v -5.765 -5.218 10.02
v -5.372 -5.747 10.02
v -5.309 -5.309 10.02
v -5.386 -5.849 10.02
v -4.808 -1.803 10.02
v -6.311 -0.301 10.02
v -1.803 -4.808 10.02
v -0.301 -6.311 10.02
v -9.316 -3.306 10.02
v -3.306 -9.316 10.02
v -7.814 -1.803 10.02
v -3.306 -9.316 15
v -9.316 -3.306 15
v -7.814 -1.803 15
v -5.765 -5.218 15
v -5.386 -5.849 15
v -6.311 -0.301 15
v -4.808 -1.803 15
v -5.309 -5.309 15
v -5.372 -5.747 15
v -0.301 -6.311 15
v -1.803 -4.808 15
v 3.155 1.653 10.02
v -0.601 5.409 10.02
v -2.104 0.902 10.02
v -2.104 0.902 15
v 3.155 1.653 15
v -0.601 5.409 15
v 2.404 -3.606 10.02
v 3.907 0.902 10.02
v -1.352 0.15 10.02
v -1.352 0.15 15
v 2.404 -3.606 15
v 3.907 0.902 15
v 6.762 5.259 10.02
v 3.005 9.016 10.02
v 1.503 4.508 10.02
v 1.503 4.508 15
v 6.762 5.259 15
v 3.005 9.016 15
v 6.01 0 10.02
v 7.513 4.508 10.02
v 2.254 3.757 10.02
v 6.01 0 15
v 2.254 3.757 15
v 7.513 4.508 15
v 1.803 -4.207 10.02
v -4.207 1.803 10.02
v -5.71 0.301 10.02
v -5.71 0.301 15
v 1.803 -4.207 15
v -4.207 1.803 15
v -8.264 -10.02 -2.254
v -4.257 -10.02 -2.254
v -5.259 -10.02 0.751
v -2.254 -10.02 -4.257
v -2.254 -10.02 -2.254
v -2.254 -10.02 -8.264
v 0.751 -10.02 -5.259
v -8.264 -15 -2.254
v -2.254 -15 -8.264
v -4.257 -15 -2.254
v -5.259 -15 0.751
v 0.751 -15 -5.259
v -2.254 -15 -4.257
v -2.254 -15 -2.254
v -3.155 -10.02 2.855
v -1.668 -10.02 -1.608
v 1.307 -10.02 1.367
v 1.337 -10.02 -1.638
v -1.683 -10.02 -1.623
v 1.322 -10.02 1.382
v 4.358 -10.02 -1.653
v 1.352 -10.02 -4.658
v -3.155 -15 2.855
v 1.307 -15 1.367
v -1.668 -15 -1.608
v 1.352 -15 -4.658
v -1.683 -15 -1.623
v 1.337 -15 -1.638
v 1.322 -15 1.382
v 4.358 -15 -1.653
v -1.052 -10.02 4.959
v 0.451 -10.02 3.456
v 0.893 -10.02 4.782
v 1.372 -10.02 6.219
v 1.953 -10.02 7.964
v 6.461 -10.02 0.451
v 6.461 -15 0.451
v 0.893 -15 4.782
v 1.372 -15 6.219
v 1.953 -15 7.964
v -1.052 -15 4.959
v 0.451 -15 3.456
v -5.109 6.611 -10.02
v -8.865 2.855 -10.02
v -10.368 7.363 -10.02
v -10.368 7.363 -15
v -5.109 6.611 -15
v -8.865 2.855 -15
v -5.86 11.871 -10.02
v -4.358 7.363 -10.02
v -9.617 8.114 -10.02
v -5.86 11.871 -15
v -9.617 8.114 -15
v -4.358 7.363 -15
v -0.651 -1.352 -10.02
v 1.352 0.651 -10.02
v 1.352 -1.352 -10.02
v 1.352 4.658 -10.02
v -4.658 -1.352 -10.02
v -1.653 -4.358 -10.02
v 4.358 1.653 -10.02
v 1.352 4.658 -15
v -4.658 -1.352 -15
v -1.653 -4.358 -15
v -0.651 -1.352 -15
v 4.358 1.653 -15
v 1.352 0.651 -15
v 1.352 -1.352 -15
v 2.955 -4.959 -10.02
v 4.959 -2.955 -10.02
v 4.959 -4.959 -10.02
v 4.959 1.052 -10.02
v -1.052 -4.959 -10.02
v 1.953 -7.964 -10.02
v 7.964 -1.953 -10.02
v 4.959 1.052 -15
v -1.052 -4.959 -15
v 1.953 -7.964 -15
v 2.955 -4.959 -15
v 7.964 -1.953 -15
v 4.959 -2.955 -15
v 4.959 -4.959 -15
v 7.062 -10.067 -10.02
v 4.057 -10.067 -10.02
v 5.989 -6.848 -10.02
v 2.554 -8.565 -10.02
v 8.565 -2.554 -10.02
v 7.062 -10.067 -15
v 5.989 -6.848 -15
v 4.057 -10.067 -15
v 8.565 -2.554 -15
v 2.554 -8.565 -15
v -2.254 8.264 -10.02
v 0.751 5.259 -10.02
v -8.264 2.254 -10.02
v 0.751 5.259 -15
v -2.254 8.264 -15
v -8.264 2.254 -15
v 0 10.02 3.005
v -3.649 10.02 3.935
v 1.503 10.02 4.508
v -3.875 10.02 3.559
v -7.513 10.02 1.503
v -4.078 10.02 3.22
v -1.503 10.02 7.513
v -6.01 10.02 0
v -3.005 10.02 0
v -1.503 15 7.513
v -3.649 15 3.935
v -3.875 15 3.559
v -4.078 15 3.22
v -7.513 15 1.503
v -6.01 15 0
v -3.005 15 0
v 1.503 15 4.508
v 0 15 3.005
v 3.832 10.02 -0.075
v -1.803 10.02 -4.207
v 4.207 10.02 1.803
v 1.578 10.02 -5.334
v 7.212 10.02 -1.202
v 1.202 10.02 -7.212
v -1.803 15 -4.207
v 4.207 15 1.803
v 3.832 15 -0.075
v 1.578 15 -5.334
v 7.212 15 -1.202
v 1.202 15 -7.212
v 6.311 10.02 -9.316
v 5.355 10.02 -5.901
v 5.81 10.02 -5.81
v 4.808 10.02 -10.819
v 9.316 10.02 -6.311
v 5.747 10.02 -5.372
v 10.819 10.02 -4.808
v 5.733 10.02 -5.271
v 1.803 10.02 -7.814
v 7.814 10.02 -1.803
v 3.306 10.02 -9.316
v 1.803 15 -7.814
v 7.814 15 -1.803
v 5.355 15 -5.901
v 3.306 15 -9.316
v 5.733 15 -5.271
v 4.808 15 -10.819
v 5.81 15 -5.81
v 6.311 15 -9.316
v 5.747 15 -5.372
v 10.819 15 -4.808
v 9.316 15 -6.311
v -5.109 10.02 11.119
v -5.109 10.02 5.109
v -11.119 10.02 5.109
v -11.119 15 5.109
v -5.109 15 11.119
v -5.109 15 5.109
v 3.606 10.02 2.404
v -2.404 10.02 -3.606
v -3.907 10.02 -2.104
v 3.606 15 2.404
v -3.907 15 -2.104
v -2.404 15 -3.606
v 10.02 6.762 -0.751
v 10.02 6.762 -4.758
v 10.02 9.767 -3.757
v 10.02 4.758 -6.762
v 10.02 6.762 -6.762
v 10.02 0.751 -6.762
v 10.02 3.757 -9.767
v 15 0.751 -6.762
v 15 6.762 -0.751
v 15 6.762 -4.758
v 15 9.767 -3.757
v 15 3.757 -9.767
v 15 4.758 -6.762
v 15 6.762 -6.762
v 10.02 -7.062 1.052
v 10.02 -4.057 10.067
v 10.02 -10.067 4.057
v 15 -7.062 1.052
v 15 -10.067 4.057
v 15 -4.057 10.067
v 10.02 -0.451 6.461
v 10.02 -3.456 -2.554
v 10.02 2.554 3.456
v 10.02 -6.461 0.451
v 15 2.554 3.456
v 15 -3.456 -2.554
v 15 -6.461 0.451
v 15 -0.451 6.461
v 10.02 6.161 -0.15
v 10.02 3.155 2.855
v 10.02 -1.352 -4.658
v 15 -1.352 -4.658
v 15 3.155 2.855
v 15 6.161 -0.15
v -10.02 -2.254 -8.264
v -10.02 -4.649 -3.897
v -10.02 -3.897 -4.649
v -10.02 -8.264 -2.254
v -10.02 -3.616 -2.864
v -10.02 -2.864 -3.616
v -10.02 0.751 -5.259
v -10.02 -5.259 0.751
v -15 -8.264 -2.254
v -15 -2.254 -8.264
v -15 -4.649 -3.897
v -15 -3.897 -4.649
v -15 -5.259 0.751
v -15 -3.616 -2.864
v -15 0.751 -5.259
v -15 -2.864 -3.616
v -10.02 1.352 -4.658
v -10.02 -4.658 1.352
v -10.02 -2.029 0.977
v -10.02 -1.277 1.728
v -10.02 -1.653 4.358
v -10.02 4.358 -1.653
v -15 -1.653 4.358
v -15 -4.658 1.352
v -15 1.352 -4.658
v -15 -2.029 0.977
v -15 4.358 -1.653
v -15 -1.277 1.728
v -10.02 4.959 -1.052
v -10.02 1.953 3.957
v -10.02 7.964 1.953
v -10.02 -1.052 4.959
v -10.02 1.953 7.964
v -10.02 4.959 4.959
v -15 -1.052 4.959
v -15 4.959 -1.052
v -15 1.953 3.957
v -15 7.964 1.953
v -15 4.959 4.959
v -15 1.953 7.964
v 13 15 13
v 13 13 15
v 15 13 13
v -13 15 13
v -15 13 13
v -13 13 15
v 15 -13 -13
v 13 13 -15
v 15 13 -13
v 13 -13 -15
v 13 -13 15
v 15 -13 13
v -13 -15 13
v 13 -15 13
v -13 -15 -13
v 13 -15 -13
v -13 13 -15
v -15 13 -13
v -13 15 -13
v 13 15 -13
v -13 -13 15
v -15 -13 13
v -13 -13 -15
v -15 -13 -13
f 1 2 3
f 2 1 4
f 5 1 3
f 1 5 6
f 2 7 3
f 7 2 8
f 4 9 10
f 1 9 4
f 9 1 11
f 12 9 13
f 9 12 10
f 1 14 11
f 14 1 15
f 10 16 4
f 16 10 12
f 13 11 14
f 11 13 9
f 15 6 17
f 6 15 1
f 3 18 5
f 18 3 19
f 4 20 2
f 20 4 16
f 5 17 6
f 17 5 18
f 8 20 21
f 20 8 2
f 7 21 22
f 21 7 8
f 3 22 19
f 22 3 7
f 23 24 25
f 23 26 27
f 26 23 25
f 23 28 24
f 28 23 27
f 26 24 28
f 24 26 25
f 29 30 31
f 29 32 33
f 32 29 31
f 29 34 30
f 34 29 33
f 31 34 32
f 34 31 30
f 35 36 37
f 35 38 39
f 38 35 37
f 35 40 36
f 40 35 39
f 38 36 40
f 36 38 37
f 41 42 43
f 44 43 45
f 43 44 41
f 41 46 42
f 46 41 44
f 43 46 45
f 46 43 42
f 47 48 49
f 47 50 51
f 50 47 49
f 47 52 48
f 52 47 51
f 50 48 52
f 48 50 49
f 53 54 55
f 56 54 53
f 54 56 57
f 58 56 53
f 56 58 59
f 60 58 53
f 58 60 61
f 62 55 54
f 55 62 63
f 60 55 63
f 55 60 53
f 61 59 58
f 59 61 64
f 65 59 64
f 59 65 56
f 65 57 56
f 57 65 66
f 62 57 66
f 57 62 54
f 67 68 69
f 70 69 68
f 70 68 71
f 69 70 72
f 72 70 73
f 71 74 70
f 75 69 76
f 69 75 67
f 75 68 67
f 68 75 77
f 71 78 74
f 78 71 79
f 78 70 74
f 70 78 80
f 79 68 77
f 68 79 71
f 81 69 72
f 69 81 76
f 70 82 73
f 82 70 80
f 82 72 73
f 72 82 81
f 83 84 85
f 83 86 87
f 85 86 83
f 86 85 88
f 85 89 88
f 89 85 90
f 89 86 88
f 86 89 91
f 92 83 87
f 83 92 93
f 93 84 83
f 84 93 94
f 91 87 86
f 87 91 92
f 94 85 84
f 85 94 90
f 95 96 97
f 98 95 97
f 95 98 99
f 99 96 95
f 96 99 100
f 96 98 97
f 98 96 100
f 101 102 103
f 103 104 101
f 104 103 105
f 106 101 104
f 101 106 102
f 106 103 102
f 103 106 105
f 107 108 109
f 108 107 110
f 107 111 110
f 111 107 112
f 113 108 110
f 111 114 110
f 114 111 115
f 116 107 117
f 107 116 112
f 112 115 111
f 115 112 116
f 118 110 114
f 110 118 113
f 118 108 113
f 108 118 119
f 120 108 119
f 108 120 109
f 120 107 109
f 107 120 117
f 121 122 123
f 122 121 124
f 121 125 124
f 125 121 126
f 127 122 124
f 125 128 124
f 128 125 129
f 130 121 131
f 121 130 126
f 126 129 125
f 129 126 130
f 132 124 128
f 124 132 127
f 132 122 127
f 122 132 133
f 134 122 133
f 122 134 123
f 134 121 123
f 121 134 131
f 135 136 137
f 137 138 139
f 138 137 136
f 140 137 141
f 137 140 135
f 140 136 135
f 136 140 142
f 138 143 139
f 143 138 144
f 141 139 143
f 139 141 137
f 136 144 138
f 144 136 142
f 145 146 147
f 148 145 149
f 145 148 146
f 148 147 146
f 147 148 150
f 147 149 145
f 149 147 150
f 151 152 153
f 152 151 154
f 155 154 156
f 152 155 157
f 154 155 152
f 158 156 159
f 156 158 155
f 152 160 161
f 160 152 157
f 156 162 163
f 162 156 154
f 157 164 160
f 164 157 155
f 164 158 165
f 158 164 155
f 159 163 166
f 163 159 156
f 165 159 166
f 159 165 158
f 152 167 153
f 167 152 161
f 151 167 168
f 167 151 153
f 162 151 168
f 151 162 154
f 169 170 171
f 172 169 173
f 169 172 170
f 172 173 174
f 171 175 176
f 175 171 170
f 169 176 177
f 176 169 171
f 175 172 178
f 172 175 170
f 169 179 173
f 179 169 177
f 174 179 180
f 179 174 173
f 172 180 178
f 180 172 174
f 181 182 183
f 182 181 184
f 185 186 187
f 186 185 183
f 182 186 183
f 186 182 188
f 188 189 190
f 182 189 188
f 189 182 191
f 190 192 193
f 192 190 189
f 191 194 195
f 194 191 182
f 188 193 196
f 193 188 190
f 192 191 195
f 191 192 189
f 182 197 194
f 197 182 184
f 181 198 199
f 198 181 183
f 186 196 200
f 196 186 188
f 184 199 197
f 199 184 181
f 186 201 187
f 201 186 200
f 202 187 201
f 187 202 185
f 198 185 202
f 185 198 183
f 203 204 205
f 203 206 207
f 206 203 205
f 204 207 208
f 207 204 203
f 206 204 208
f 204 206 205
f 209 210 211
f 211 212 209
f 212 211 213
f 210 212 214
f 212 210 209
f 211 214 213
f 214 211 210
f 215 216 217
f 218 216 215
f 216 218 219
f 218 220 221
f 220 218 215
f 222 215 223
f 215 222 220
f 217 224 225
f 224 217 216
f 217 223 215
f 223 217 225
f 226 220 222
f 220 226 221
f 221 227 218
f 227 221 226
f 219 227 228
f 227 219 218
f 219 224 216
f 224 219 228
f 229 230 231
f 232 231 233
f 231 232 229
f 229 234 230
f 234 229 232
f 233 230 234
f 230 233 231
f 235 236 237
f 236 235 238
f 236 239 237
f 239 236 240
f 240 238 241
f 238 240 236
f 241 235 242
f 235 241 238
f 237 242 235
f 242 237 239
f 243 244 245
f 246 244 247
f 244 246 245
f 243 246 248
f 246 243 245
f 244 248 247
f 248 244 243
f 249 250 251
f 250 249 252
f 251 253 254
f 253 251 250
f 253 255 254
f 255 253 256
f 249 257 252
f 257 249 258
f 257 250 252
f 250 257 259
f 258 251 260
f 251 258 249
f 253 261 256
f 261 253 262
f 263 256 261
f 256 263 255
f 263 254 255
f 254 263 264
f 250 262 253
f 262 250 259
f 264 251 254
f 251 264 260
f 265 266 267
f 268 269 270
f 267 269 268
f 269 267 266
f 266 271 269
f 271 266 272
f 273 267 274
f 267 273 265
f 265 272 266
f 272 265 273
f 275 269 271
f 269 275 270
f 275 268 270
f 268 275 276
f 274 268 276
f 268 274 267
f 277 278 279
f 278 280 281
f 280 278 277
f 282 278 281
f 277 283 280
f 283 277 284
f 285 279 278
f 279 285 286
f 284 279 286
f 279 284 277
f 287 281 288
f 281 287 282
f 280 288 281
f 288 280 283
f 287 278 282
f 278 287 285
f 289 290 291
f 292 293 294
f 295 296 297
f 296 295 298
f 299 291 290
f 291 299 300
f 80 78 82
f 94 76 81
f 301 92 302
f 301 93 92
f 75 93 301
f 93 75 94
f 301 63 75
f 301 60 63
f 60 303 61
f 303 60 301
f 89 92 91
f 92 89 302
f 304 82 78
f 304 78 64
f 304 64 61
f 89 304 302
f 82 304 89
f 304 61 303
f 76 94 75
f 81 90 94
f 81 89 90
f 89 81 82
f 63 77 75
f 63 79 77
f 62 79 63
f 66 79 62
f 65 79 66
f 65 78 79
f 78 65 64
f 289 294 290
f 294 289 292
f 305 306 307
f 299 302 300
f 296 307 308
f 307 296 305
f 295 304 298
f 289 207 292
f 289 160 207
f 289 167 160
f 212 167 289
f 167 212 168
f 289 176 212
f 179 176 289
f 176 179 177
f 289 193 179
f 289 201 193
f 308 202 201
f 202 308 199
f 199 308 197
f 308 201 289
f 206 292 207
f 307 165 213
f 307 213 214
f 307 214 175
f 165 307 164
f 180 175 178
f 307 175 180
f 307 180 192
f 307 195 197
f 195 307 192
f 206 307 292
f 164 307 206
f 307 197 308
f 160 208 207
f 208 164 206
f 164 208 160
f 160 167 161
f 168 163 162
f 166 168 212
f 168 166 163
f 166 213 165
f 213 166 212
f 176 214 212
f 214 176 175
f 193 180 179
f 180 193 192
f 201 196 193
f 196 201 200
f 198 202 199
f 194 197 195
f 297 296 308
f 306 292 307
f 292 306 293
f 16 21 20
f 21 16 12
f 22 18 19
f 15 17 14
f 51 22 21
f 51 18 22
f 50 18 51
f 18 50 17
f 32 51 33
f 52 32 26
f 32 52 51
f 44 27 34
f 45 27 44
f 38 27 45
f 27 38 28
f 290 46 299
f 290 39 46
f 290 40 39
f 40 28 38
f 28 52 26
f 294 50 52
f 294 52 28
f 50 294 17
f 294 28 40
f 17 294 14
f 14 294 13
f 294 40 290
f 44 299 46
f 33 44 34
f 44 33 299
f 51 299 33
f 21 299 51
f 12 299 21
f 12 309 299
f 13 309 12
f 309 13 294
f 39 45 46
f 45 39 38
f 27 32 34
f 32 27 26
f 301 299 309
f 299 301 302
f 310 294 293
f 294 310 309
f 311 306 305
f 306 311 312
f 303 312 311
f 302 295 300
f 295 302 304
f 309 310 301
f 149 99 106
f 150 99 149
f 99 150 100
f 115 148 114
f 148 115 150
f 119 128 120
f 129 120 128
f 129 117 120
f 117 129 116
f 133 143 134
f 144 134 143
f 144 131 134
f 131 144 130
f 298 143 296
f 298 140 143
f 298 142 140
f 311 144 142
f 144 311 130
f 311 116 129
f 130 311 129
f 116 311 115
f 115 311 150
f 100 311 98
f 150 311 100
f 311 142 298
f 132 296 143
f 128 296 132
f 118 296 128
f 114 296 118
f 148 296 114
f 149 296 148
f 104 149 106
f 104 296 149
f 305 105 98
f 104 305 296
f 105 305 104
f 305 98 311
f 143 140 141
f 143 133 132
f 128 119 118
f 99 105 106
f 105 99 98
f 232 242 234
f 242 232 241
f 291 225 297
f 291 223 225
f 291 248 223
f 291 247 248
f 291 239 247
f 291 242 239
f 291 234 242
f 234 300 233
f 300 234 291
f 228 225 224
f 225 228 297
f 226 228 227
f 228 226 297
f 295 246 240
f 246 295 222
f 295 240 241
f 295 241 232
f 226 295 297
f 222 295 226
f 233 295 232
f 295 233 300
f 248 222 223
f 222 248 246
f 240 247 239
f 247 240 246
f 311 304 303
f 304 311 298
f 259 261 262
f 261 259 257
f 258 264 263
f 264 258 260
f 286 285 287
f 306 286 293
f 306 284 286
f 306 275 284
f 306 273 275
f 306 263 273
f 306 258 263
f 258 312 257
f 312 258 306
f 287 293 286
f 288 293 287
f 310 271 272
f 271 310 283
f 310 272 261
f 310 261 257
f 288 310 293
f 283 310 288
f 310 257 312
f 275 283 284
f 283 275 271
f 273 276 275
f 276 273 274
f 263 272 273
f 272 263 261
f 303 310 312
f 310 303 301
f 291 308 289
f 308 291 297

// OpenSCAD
// fcubewithtextv1_0
// GPLv2
// (c) 2013 TakeItAndRun
//
// v0_1:
// 
// 
//

// INCLUDE

//use <lowpolyfont v1_0.scad>;
//file pasted at end of file

//*******************************************************
//
//
//
//*******************************************************

/* [text] */

ttext1="KISS";
ttext2="EAT";
ttext3="SLEEP";
ttext4="DRINK";
ttext5="LOVE";
ttext6="HUG";

/* type */

//depth of text
dt=5;//[1:10]

//scale for all text
s0=8.5;//[1:25]
//individual text scale
s1=1.0;
s2=1.0;
s3=1.0;
s4=1.0;
s5=1.0;
s6=1.0;

/* [dice] */

//size of dice
dd=30;//[5:100]

//width of edge
de=2;//[1:10]


/* HIDDEN */

ttext=[ttext1,ttext2,ttext3,ttext4,ttext5,ttext6];
s=s0*[s1,s2,s3,s4,s5,s6];

//*******************************************************
//
// basic definitions
//
//*******************************************************


// circle have $fn facets
$fn=32;

// small displacement to avoid parallel faces with zero volume
e=0.02;

// unit vectors
xaxis=[1,0,0];
yaxis=[0,1,0];
zaxis=[0,0,1];

// golden ratio
phi=(1+sqrt(5))/2;

//*******************************************************
//
// dimensions
//
//*******************************************************

dxprint=3;

col1="red";
col2="lime";


//*******************************************************
//
// routines
//
//*******************************************************

module fcube(v=[dd,dd,dd],f=de,center=false){
	translate(center?0:f*[1,1,1])
	minkowski(){
		cube(v-2*f*[1,1,1],center);
		scale(f)polyhedron(
			[[1,0,0],[0,1,0],[-1,0,0],[0,-1,0],[0,0,1],[0,0,-1]],
			[[0,1,4],[1,2,4],[2,3,4],[3,0,4],[1,0,5],[2,1,5],[3,2,5],[0,3,5]]
		);
	}
}

a=[[0,0,0],[90,0,0],[180,0,0],[270,0,0],[0,90,0],[0,270,0]];

module dice(){
	difference(){
		color("blue")
		fcube(center=true);
		for(i=[0:5])
			rotate(a[i])
			translate((dd/2-dt+e)*zaxis)
			rotate(45)
			scale([s[i]/10,s[i]/10,dt/2])
				color("yellow")
				type(ttext[i],center=true);
	}
}



//*******************************************************
//
// main program
//
//*******************************************************

dice();



// INCLUDE

// lowpolyfont v1_0
// GPLv2
// (c) 2013 TakeItAndRun
//
// v1_1: 
//

/*





*/
//*******************************************************
//
// Low polygon count font
//
//*******************************************************



//*******************************************************
//
// basic definitions
//
//*******************************************************


// small displacement to avoid parallel faces with zero volume
e=+0.02;

// unit vectors
xaxis=+[1,0,0];
yaxis=+[0,1,0];
zaxis=+[0,0,1];

//*******************************************************
//
// dimensions
//
//*******************************************************

/* [text] */

//number of lines
nl=4;//[1:4]

// Text (ONLY CAPITALS!)
text1="THE QUICK BROWN";
text2="FOX JUMBED OVER";
text3="THE LAZY DOG.";
text4="1234567890.:!?";



/* [type] */

//thickness of type
t=2;//[.1:10]

//height of type
h=10;//[1:50]

//width of type
w=5;//[1:50]

//spacing between letters
d=1;//[0.0:5.0]
dpos=d;

//conical shape
//pq=40;//[0:100]
//q=pq/100;

// spacing between lines
dl=4;//[0.0:10:0]

/* [sign] */

// sign
sign=!false;//[false:none,true:sign]
//length past type
dsx=3;//[0:10]
//height above type
dsy=3;//[0:10]
//thickness of the sign
sz=1;//[1:10]
// edge
edge=!false;//[false:none,true:sign]
// width of edge
we=1;//[0.1:10.0]


/* [Hidden] */

text=["",text1,text2,text3,text4];


//*******************************************************
//
// polygons of the letters:
//	Every letter is one element of the array fo:
// the first number is the width of the letter
//	then follows a list of polygons
//
//	the key to the (order of the) letters is the string str0
//
//*******************************************************

str0=" ABCDEFGHIJKLMNOPQRSTUVWXYZ1234567890.:!?";

fo=
[
[
// space
2,
[],

],[
//A
2,
[[0,2],[1,4],[2,2]],
[[0,2+e],[2,2+e],[0,0]],
[[0,2+e],[2,2+e],[2,0]],
],[
//B
2,
[[0,4],[2,3],[0,1.5]],
[[0,2.5],[2,1],[0,0]],
],[
//C
2,
[[0,2],[2,4],[2,0]],
],[
//D
2,
[[0,4],[2,2],[0,0]],
],[
//E
2,
[[0,4],[2,4],[0,0]],
[[0,4],[2,0],[0,0]],
[[0,4],[2,2],[0,0]],
],[
//F
2,
[[0,4],[2,4],[0,0]],
],[
//G
2,
[[0,4],[2,4],[0,0]],
[[0,1],[2,2],[2,0],[0,0]],
],[
//H
2,
[[0,4],[.75,2],[0,0]],
[[1.25,2],[2,4],[2,0]],
[[0,2.25],[2,2.25],[2,1.75],[0,1.75]],
],[
//I
1,
[[0,4],[1,4],[1,0]],
],[
//J
1,
[[1,4],[1,0],[0,0]],
],[
//K
2,
[[0,4],[1,4],[0,0]],
[[0,1.5],[2,4],[2,3]],
[[0,2.5],[2,1],[2,0]],
],[
//L
2,
[[0,4],[2,0],[0,0]],
],[
//M
2,
[[0,4],[2,2],[2,0],[0,0]],
[[2,4],[2,0],[0,0],[0,2]],
],[
//N
2,
[[0,4],[2,3],[0,0]],
[[0,1],[2,4],[2,0]],
],[
//O
2,
[[0,4],[2,4],[2,0],[0,0]],
],[
//P
2,
[[1,4],[2,3],[0,2]],
[[0,4],[1,4],[0,0]],
],[
//Q
2,
[[0,4],[2,4],[2,1.25],[.75,0],[0,0]],
[[0,2],[2,.5],[2,0],[1.5,0]],
//[[1.5,1],[2,0],[1,.5]],
],[
//R
2,
[[0,4],[1,4],[0,0]],
[[0,2],[1,4],[2,3]],
[[0,2.5],[2,1],[2,0]],
],[
//S
2,
[[2,4],[2,1.5],[0,3]],
[[0,2.5],[2,1],[0,0]],
],[
//T
2,
[[0.5,4],[1.25,4],[1,0]],
[[0,4],[2,4],[0,3]],
],[
//U
2,
[[0,4],[1,0],[0,0]],
[[2,4],[2,0],[1,0]],
[[0,0],[0,1],[2,1],[2,0]],
],[
//V
2,
[[0,4],[2,4],[1,0]],
],[
//W
2,
[[0,4],[2,4],[2,0],[0,2]],
[[0,4],[2,4],[2,2],[0,0]],
],[
//X
2,
[[0,4],[1.5,2],[.5,2]],
[[2,4],[1.5,2],[.5,2]],
[[0,0],[.5,2],[1.5,2]],
[[2,0],[.5,2],[1.5,2]],
],[
//Y
2,
[[0,4],[2,4],[1,2]],
[[0.5,4],[1.25,4],[1,0]],
],[
//Z
2,
[[0,4],[2,4],[2,3]],
[[0,0],[0,1],[2,0]],
[[0,1],[1.5,4],[2,3],[.5,0]],
],[
//1
1,
[[0,0],[1,4],[1,0]],
[[0,4],[1,4],[1,3]],
],[
//2
2,
[[0,4],[2,3],[0,2]],
[[0,0],[0,1],[2,0]],
[[0,1],[1.5,3],[2,3],[0,0]],
],[
//3
2,
[[0,4],[2,3],[0,2]],
[[0,0],[0,2+e],[2,1]],
],[
//4
2,
[[1,0],[2,4],[2,0]],
[[0,4],[2,2],[0,2]],
],[
//5
2,
[[0,4],[2,4],[0,2]],
[[0,0],[0,2+e],[2,1]],
],[
//6
2,
[[1,0],[0,1],[1,2],[2,1]],
[[0,4],[1,4],[.25,1],[0,1]],
],[
//7
2,
//[[0,4],[2,4],[2,3.5],[0,3]],
//[[0,4],[1,4],[.25,1],[0,1]],
[[0,4],[2,4],[2,0]],
],[
//8
2,
[[1,0],[0,1],[1,2+e],[2,1]],
[[1,4],[2,3],[1,2],[0,3]],
],[
//9
2,
[[1,4],[2,3],[1,2],[0,3]],
[[1,0],[1.75,3],[2,3],[2,0]],
],[
//0
2,
[[1,0],[0,1],[0,3],[1,4],[2,3],[2,1]],
],[
//.
1,
[[0,0],[1,1],[1,0]],
],[
//:
1,
[[0,0],[1,1],[1,0]],
[[0,2],[1,3],[1,2]],
],[
//!
1,
[[0,0],[1,1],[1,0]],
[[0,4],[1,4],[.5,1+e]],
],[
//?
2,
[[0.5,0],[1.5,1],[1.5,0]],
[[1,4],[2,4],[1,1+e]],
[[0,4],[2,4],[0,3]],
],[

]
];


//*******************************************************
//
// routines
//
//*******************************************************

// make the i-th letter in the string str0
module letter(s){
	for(i=[1:len(fo[s])-1]){
// comment out the line with linear_extrude to get a 2-dim output for a dxf export
	linear_extrude(height=t)
		scale([w/2,h/4])polygon(fo[s][i]);
	}
}

// print one line of text 
// str: text to be printed (use only letters that are included in the string str0 (capital letters, numbers, some special characters)
module type(str,center=false){
	translate([(center)?-(pos(len(str),str)-dpos/2)/2:0,(center)?-h/2:0,0])
	for(i=[0:len(str)-1]){
		translate(pos(i,str)*xaxis)
		letter(index(str[i],str0));
	}
}


module sign(){
// calculate x,y-dimensions of the sign
	ssx=maximum(nl)+2*dsx+((edge)?4*we:0);
	ssy=nl*h+(nl-1)*dl+2*dsy+((edge)?4*we:0);

	color("yellow")
	translate((nl-1)*(h+dl)/2*yaxis+((sign)?sz:0)*zaxis)
	for (i=[1:nl]){
		translate(-(i-1)*(h+dl)*yaxis)
			type(text[i],true);
	}
	if (sign){
		color("blue")
		translate(sz/2*zaxis)
			cube([ssx,ssy,sz],true);
		color("yellow")
		translate((sz+t/2)*zaxis)
			for(m=[-1,1]){
				translate(m*(ssy-3*we)/2*yaxis)
					cube([ssx-2*we,we,t],true);
				translate(m*(ssx-3*we)/2*xaxis)
					cube([we,ssy-2*we,t],true);
			}
	}
}



// get the length of the longest line
function maximum(nl,i=1)=(i<nl)?
	max((pos(len(text[i]),text[i])-dpos/2),maximum(nl,i+1)):
	(pos(len(text[i]),text[i])-dpos/2)
;

// return index of a letter in the fo vector / string str0
function index(str)=
	search(str,str0)[0];


// Calculate the position of the i-th letter as sum of the
// width plus spacing of all the letters before it.
// This function looks so witty because OpenSCAD does not
// allow re-assignment of variables during run time.
// The idea for this function (somewhat simplified) I took from
// http://www.thingiverse.com/thing:22730
// by Bernhard -HotKey- Slawik, http://www.bernhardslawik.de
// This function is defined only for 80 characters. You may 
// expand it if you need more than 80 characters per line.
function pos(i,str)=
	w/2*(
	(i==0)?0:i*dpos*2/w
	+((i>=1)?fo[index(str[0])][0]:0)
	+((i>=2)?fo[index(str[1])][0]:0)
	+((i>=3)?fo[index(str[2])][0]:0)
	+((i>=4)?fo[index(str[3])][0]:0)
	+((i>=5)?fo[index(str[4])][0]:0)
	+((i>=6)?fo[index(str[5])][0]:0)
	+((i>=7)?fo[index(str[6])][0]:0)
	+((i>=8)?fo[index(str[7])][0]:0)
	+((i>=9)?fo[index(str[8])][0]:0)
	+((i>=10)?fo[index(str[9])][0]:0)
	+((i>=11)?fo[index(str[10])][0]:0)
	+((i>=12)?fo[index(str[11])][0]:0)
	+((i>=13)?fo[index(str[12])][0]:0)
	+((i>=14)?fo[index(str[13])][0]:0)
	+((i>=15)?fo[index(str[14])][0]:0)
	+((i>=16)?fo[index(str[15])][0]:0)
	+((i>=17)?fo[index(str[16])][0]:0)
	+((i>=18)?fo[index(str[17])][0]:0)
	+((i>=19)?fo[index(str[18])][0]:0)
	+((i>=20)?fo[index(str[19])][0]:0)
	+((i>=21)?fo[index(str[20])][0]:0)
	+((i>=22)?fo[index(str[21])][0]:0)
	+((i>=23)?fo[index(str[22])][0]:0)
	+((i>=24)?fo[index(str[23])][0]:0)
	+((i>=25)?fo[index(str[24])][0]:0)
	+((i>=26)?fo[index(str[25])][0]:0)
	+((i>=27)?fo[index(str[26])][0]:0)
	+((i>=28)?fo[index(str[27])][0]:0)
	+((i>=29)?fo[index(str[28])][0]:0)
	+((i>=30)?fo[index(str[29])][0]:0)
	+((i>=31)?fo[index(str[30])][0]:0)
	+((i>=32)?fo[index(str[31])][0]:0)
	+((i>=33)?fo[index(str[32])][0]:0)
	+((i>=34)?fo[index(str[33])][0]:0)
	+((i>=35)?fo[index(str[34])][0]:0)
	+((i>=36)?fo[index(str[35])][0]:0)
	+((i>=37)?fo[index(str[36])][0]:0)
	+((i>=38)?fo[index(str[37])][0]:0)
	+((i>=39)?fo[index(str[38])][0]:0)
	+((i>=40)?fo[index(str[39])][0]:0)
	+((i>=41)?fo[index(str[40])][0]:0)
	+((i>=42)?fo[index(str[41])][0]:0)
	+((i>=43)?fo[index(str[42])][0]:0)
	+((i>=44)?fo[index(str[43])][0]:0)
	+((i>=45)?fo[index(str[44])][0]:0)
	+((i>=46)?fo[index(str[45])][0]:0)
	+((i>=47)?fo[index(str[46])][0]:0)
	+((i>=48)?fo[index(str[47])][0]:0)
	+((i>=49)?fo[index(str[48])][0]:0)
	+((i>=50)?fo[index(str[49])][0]:0)
	+((i>=51)?fo[index(str[50])][0]:0)
	+((i>=52)?fo[index(str[51])][0]:0)
	+((i>=53)?fo[index(str[52])][0]:0)
	+((i>=54)?fo[index(str[53])][0]:0)
	+((i>=55)?fo[index(str[54])][0]:0)
	+((i>=56)?fo[index(str[55])][0]:0)
	+((i>=57)?fo[index(str[56])][0]:0)
	+((i>=58)?fo[index(str[57])][0]:0)
	+((i>=59)?fo[index(str[58])][0]:0)
	+((i>=60)?fo[index(str[59])][0]:0)
	+((i>=61)?fo[index(str[60])][0]:0)
	+((i>=62)?fo[index(str[61])][0]:0)
	+((i>=63)?fo[index(str[62])][0]:0)
	+((i>=64)?fo[index(str[63])][0]:0)
	+((i>=65)?fo[index(str[64])][0]:0)
	+((i>=66)?fo[index(str[65])][0]:0)
	+((i>=67)?fo[index(str[66])][0]:0)
	+((i>=68)?fo[index(str[67])][0]:0)
	+((i>=69)?fo[index(str[68])][0]:0)
	+((i>=70)?fo[index(str[69])][0]:0)
	+((i>=71)?fo[index(str[70])][0]:0)
	+((i>=72)?fo[index(str[71])][0]:0)
	+((i>=73)?fo[index(str[72])][0]:0)
	+((i>=74)?fo[index(str[73])][0]:0)
	+((i>=75)?fo[index(str[74])][0]:0)
	+((i>=76)?fo[index(str[75])][0]:0)
	+((i>=77)?fo[index(str[76])][0]:0)
	+((i>=78)?fo[index(str[77])][0]:0)
	+((i>=79)?fo[index(str[78])][0]:0)
	+((i>=80)?fo[index(str[79])][0]:0)
	)
//	+((i>=4)?fo[index(str[4])][0]:0)

;


//*******************************************************
//
// main program
//
//*******************************************************



// one line of text
//str="THE QUICK BROWN FOX JUMBED OVER THE LAZY DOG.";
//str=str0;
//type(str,!true);

// sign with up to 4 lines of text (if sign=true, else just the text)
//sign();
